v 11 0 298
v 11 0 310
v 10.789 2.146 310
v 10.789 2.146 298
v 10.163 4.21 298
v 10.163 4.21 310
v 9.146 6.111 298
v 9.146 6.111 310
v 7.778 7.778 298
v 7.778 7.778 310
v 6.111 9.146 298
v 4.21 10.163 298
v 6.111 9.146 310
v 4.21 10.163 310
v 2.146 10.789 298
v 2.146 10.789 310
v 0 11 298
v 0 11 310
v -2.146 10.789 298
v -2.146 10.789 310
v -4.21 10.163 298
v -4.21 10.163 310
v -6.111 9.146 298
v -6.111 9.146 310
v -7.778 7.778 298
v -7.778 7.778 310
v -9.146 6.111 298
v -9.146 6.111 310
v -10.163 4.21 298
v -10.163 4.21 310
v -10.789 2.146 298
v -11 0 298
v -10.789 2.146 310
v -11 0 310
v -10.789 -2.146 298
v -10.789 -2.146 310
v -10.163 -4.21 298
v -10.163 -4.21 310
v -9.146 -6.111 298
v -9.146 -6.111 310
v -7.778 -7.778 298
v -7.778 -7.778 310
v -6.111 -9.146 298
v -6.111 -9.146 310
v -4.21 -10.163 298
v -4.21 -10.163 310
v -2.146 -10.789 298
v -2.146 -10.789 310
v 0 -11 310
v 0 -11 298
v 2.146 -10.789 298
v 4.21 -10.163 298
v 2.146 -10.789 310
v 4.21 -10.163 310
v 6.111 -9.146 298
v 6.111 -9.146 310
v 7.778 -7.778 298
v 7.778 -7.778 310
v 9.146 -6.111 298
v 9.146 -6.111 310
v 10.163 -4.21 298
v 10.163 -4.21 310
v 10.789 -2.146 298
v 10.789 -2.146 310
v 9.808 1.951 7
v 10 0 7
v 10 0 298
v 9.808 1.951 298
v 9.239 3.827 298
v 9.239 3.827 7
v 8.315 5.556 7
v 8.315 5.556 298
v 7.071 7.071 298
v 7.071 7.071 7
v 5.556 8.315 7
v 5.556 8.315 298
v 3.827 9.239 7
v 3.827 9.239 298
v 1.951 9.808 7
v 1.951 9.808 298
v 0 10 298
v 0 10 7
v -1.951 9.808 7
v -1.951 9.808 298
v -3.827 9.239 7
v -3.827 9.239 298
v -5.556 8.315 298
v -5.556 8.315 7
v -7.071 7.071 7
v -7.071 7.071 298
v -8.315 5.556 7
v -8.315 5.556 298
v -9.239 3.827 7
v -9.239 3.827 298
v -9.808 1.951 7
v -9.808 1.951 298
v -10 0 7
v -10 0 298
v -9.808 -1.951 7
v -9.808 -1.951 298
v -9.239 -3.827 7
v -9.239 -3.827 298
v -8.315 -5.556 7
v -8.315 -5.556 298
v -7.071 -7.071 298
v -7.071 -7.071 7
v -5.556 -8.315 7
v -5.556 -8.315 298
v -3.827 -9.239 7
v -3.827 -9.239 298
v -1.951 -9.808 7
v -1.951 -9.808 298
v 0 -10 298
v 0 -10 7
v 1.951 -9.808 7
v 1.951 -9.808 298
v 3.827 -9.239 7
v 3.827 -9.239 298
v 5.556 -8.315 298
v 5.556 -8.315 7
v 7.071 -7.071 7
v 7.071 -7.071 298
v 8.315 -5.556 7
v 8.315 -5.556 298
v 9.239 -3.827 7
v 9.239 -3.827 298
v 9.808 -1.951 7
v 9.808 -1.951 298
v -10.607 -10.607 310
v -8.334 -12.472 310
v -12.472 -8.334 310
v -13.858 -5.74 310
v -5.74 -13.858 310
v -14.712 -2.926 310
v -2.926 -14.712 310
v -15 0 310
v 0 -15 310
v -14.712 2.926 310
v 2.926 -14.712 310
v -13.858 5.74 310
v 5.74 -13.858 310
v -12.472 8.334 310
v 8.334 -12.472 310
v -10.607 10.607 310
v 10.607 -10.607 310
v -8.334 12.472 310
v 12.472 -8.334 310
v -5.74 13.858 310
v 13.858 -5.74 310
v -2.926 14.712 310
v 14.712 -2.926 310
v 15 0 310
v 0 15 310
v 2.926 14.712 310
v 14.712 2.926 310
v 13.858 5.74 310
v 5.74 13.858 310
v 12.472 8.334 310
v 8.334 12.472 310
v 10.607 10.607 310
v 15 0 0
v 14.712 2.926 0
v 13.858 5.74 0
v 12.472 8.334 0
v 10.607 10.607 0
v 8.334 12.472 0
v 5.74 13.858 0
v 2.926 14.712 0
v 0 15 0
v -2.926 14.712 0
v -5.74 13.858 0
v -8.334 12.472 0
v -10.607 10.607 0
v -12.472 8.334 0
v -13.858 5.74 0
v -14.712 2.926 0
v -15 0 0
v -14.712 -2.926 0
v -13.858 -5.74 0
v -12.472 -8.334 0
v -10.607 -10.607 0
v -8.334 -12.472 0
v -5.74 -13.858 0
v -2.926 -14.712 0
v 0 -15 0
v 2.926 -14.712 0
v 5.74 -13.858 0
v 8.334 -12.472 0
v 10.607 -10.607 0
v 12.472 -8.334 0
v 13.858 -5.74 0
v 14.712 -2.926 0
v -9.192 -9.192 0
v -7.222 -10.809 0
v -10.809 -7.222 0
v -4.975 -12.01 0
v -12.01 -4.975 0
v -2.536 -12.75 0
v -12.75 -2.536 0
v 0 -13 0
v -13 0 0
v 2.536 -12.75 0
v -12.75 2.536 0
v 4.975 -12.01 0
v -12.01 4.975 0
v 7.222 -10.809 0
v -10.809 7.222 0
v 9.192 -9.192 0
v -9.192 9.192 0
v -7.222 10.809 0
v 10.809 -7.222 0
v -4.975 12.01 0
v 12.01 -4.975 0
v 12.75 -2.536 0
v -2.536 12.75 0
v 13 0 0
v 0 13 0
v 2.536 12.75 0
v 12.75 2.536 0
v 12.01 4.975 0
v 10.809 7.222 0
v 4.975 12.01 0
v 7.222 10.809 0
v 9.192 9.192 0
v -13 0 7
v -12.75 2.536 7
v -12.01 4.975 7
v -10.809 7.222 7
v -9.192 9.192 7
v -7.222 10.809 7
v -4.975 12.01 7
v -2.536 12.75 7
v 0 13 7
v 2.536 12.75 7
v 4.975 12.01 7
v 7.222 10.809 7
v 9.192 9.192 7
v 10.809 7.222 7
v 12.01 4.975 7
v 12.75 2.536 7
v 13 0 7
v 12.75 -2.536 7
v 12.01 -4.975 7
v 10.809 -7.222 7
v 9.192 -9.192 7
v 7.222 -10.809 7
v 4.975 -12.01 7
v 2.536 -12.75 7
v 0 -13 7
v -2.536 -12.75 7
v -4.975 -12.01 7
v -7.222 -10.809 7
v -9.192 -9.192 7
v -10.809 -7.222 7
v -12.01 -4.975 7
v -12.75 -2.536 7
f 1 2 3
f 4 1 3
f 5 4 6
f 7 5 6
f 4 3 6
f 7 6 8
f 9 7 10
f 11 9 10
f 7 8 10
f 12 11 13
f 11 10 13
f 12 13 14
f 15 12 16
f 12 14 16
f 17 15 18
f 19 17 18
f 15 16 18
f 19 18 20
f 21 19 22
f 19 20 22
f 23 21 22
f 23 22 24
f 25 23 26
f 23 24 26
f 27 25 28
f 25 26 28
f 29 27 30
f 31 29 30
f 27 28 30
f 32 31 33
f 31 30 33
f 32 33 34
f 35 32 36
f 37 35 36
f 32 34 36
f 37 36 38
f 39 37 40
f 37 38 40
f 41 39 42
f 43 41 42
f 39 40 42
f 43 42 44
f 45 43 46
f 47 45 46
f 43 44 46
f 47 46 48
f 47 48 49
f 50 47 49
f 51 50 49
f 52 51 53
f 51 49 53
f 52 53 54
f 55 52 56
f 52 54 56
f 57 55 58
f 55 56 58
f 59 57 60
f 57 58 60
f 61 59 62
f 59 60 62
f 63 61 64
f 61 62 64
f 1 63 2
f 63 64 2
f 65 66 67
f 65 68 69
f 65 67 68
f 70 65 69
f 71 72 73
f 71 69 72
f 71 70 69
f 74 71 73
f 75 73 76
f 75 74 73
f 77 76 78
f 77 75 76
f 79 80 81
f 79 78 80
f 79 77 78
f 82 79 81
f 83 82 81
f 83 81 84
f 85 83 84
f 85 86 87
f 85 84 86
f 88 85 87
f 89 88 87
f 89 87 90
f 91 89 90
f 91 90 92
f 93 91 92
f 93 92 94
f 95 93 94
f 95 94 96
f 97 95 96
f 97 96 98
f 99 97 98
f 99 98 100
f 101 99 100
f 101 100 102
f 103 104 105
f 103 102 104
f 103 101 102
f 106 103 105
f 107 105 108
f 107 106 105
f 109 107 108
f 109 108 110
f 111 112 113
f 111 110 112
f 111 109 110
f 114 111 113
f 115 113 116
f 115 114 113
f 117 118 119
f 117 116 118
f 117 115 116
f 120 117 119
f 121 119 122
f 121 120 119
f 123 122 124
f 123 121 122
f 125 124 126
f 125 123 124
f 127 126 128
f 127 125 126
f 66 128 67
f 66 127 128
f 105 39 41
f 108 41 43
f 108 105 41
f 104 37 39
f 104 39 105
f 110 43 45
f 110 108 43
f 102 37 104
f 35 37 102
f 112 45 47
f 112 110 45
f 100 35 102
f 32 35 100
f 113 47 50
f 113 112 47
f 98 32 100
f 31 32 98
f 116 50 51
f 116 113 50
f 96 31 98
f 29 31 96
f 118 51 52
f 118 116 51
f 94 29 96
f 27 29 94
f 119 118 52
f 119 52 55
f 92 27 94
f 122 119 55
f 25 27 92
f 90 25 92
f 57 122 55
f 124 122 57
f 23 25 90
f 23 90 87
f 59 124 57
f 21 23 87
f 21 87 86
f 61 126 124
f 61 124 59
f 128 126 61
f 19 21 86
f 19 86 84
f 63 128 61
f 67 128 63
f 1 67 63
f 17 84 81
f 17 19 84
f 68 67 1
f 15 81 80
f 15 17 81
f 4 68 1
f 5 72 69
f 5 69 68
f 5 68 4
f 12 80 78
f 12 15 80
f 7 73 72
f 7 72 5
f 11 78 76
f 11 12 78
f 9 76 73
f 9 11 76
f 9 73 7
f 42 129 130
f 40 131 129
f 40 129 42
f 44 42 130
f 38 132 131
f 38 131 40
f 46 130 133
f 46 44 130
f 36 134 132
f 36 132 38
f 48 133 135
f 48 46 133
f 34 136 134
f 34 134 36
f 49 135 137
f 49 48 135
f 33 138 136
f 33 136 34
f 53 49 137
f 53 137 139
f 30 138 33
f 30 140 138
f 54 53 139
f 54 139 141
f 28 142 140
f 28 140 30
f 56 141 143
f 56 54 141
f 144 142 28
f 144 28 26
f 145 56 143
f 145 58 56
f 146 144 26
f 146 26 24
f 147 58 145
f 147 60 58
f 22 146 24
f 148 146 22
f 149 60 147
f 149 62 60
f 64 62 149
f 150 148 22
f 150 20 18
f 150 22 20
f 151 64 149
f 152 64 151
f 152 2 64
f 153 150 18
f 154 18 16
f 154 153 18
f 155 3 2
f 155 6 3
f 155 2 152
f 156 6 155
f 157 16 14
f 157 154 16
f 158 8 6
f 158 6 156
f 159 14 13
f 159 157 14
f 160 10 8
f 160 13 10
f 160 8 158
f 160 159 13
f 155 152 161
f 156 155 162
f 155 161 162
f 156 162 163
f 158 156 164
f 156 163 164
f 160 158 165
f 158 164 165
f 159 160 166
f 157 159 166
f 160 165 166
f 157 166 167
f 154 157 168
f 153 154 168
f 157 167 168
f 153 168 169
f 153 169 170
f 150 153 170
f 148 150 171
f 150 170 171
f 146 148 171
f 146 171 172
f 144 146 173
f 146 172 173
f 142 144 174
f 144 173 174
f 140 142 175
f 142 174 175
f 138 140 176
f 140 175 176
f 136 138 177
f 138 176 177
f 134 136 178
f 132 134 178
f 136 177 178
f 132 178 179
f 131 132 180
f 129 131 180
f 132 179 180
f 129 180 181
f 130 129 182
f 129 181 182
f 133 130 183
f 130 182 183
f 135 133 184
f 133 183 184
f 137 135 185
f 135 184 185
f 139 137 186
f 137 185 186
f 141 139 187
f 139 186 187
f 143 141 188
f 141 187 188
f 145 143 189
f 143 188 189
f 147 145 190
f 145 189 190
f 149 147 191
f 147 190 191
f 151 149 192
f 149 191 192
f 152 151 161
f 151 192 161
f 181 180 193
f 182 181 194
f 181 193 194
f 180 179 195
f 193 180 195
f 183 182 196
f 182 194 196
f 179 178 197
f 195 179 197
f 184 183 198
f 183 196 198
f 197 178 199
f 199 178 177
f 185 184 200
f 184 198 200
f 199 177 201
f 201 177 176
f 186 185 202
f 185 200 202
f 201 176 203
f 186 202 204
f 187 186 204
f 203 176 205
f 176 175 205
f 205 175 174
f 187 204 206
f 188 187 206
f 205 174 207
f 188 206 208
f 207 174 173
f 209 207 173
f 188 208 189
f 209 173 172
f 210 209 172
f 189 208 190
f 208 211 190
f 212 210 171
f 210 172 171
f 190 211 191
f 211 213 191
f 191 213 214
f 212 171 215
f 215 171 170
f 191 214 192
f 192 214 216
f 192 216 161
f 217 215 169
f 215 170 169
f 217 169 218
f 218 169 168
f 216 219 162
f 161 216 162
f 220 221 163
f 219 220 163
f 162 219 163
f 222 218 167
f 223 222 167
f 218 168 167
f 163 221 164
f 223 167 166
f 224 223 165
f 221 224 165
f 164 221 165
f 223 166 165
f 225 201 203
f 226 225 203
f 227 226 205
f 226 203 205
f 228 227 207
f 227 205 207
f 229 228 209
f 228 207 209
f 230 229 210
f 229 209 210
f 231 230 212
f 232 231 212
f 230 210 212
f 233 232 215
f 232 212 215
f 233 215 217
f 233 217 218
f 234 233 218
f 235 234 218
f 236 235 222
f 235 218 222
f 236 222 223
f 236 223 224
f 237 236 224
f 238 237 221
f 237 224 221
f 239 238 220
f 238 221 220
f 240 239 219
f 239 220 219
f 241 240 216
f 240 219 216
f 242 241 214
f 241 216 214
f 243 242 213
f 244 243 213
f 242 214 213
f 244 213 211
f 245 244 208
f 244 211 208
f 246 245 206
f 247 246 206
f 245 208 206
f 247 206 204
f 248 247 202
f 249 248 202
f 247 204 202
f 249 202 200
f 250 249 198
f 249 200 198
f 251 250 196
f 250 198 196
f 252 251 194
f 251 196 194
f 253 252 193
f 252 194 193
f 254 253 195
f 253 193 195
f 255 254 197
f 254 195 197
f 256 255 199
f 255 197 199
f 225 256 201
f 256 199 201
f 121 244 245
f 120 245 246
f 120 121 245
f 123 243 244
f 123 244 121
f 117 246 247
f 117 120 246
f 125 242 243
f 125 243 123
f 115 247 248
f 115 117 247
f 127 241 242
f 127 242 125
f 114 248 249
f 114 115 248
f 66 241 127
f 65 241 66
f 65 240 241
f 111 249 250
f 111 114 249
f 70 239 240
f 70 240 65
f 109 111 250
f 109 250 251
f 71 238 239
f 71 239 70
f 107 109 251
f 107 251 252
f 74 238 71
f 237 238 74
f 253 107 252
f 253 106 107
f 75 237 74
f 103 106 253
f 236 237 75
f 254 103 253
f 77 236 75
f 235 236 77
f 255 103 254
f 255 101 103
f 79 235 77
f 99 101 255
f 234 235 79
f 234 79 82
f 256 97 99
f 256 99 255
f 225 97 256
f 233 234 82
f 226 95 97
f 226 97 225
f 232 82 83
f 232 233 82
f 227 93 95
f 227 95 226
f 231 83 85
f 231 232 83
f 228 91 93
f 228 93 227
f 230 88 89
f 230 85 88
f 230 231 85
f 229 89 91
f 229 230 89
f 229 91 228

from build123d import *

# Parameters (mm, degrees)
ESQUISSE1_R             = 15
ESQUISSE1_R_2           = 10
BOSS_EXTRU_1_DEPTH      = 310
ESQUISSE2_R             = 13
ESQUISSE2_R_2           = 10
ENL_V_MAT_EXTRU_1_DEPTH = 7
ESQUISSE3_R             = 11
ESQUISSE3_R_2           = 10
ENL_V_MAT_EXTRU_2_DEPTH = 12


with BuildPart() as part:
    # Esquisse1 → Boss.-Extru.1 (new body)
    with BuildSketch(Plane.XY):
        Circle(ESQUISSE1_R)
        Circle(ESQUISSE1_R_2, mode=Mode.SUBTRACT)
    extrude(amount=BOSS_EXTRU_1_DEPTH)

    # Esquisse2 → Enlèv. mat.-Extru.1 (cut)
    with BuildSketch(Plane(origin=(0, 0, 0), x_dir=(-1, 0, 0), z_dir=(0, 0, -1))):
        Circle(ESQUISSE2_R)
        Circle(ESQUISSE2_R_2, mode=Mode.SUBTRACT)
    extrude(amount=-ENL_V_MAT_EXTRU_1_DEPTH, mode=Mode.SUBTRACT)

    # Esquisse3 → Enlèv. mat.-Extru.2 (cut)
    with BuildSketch(Plane.XY.offset(310)):
        Circle(ESQUISSE3_R)
        with Locations(Location((0, 0, 0), (0, 0, 180))):  # turned: the seam where the file's is
            Circle(ESQUISSE3_R_2, mode=Mode.SUBTRACT)
    extrude(amount=-ENL_V_MAT_EXTRU_2_DEPTH, mode=Mode.SUBTRACT)


solid = part.part
